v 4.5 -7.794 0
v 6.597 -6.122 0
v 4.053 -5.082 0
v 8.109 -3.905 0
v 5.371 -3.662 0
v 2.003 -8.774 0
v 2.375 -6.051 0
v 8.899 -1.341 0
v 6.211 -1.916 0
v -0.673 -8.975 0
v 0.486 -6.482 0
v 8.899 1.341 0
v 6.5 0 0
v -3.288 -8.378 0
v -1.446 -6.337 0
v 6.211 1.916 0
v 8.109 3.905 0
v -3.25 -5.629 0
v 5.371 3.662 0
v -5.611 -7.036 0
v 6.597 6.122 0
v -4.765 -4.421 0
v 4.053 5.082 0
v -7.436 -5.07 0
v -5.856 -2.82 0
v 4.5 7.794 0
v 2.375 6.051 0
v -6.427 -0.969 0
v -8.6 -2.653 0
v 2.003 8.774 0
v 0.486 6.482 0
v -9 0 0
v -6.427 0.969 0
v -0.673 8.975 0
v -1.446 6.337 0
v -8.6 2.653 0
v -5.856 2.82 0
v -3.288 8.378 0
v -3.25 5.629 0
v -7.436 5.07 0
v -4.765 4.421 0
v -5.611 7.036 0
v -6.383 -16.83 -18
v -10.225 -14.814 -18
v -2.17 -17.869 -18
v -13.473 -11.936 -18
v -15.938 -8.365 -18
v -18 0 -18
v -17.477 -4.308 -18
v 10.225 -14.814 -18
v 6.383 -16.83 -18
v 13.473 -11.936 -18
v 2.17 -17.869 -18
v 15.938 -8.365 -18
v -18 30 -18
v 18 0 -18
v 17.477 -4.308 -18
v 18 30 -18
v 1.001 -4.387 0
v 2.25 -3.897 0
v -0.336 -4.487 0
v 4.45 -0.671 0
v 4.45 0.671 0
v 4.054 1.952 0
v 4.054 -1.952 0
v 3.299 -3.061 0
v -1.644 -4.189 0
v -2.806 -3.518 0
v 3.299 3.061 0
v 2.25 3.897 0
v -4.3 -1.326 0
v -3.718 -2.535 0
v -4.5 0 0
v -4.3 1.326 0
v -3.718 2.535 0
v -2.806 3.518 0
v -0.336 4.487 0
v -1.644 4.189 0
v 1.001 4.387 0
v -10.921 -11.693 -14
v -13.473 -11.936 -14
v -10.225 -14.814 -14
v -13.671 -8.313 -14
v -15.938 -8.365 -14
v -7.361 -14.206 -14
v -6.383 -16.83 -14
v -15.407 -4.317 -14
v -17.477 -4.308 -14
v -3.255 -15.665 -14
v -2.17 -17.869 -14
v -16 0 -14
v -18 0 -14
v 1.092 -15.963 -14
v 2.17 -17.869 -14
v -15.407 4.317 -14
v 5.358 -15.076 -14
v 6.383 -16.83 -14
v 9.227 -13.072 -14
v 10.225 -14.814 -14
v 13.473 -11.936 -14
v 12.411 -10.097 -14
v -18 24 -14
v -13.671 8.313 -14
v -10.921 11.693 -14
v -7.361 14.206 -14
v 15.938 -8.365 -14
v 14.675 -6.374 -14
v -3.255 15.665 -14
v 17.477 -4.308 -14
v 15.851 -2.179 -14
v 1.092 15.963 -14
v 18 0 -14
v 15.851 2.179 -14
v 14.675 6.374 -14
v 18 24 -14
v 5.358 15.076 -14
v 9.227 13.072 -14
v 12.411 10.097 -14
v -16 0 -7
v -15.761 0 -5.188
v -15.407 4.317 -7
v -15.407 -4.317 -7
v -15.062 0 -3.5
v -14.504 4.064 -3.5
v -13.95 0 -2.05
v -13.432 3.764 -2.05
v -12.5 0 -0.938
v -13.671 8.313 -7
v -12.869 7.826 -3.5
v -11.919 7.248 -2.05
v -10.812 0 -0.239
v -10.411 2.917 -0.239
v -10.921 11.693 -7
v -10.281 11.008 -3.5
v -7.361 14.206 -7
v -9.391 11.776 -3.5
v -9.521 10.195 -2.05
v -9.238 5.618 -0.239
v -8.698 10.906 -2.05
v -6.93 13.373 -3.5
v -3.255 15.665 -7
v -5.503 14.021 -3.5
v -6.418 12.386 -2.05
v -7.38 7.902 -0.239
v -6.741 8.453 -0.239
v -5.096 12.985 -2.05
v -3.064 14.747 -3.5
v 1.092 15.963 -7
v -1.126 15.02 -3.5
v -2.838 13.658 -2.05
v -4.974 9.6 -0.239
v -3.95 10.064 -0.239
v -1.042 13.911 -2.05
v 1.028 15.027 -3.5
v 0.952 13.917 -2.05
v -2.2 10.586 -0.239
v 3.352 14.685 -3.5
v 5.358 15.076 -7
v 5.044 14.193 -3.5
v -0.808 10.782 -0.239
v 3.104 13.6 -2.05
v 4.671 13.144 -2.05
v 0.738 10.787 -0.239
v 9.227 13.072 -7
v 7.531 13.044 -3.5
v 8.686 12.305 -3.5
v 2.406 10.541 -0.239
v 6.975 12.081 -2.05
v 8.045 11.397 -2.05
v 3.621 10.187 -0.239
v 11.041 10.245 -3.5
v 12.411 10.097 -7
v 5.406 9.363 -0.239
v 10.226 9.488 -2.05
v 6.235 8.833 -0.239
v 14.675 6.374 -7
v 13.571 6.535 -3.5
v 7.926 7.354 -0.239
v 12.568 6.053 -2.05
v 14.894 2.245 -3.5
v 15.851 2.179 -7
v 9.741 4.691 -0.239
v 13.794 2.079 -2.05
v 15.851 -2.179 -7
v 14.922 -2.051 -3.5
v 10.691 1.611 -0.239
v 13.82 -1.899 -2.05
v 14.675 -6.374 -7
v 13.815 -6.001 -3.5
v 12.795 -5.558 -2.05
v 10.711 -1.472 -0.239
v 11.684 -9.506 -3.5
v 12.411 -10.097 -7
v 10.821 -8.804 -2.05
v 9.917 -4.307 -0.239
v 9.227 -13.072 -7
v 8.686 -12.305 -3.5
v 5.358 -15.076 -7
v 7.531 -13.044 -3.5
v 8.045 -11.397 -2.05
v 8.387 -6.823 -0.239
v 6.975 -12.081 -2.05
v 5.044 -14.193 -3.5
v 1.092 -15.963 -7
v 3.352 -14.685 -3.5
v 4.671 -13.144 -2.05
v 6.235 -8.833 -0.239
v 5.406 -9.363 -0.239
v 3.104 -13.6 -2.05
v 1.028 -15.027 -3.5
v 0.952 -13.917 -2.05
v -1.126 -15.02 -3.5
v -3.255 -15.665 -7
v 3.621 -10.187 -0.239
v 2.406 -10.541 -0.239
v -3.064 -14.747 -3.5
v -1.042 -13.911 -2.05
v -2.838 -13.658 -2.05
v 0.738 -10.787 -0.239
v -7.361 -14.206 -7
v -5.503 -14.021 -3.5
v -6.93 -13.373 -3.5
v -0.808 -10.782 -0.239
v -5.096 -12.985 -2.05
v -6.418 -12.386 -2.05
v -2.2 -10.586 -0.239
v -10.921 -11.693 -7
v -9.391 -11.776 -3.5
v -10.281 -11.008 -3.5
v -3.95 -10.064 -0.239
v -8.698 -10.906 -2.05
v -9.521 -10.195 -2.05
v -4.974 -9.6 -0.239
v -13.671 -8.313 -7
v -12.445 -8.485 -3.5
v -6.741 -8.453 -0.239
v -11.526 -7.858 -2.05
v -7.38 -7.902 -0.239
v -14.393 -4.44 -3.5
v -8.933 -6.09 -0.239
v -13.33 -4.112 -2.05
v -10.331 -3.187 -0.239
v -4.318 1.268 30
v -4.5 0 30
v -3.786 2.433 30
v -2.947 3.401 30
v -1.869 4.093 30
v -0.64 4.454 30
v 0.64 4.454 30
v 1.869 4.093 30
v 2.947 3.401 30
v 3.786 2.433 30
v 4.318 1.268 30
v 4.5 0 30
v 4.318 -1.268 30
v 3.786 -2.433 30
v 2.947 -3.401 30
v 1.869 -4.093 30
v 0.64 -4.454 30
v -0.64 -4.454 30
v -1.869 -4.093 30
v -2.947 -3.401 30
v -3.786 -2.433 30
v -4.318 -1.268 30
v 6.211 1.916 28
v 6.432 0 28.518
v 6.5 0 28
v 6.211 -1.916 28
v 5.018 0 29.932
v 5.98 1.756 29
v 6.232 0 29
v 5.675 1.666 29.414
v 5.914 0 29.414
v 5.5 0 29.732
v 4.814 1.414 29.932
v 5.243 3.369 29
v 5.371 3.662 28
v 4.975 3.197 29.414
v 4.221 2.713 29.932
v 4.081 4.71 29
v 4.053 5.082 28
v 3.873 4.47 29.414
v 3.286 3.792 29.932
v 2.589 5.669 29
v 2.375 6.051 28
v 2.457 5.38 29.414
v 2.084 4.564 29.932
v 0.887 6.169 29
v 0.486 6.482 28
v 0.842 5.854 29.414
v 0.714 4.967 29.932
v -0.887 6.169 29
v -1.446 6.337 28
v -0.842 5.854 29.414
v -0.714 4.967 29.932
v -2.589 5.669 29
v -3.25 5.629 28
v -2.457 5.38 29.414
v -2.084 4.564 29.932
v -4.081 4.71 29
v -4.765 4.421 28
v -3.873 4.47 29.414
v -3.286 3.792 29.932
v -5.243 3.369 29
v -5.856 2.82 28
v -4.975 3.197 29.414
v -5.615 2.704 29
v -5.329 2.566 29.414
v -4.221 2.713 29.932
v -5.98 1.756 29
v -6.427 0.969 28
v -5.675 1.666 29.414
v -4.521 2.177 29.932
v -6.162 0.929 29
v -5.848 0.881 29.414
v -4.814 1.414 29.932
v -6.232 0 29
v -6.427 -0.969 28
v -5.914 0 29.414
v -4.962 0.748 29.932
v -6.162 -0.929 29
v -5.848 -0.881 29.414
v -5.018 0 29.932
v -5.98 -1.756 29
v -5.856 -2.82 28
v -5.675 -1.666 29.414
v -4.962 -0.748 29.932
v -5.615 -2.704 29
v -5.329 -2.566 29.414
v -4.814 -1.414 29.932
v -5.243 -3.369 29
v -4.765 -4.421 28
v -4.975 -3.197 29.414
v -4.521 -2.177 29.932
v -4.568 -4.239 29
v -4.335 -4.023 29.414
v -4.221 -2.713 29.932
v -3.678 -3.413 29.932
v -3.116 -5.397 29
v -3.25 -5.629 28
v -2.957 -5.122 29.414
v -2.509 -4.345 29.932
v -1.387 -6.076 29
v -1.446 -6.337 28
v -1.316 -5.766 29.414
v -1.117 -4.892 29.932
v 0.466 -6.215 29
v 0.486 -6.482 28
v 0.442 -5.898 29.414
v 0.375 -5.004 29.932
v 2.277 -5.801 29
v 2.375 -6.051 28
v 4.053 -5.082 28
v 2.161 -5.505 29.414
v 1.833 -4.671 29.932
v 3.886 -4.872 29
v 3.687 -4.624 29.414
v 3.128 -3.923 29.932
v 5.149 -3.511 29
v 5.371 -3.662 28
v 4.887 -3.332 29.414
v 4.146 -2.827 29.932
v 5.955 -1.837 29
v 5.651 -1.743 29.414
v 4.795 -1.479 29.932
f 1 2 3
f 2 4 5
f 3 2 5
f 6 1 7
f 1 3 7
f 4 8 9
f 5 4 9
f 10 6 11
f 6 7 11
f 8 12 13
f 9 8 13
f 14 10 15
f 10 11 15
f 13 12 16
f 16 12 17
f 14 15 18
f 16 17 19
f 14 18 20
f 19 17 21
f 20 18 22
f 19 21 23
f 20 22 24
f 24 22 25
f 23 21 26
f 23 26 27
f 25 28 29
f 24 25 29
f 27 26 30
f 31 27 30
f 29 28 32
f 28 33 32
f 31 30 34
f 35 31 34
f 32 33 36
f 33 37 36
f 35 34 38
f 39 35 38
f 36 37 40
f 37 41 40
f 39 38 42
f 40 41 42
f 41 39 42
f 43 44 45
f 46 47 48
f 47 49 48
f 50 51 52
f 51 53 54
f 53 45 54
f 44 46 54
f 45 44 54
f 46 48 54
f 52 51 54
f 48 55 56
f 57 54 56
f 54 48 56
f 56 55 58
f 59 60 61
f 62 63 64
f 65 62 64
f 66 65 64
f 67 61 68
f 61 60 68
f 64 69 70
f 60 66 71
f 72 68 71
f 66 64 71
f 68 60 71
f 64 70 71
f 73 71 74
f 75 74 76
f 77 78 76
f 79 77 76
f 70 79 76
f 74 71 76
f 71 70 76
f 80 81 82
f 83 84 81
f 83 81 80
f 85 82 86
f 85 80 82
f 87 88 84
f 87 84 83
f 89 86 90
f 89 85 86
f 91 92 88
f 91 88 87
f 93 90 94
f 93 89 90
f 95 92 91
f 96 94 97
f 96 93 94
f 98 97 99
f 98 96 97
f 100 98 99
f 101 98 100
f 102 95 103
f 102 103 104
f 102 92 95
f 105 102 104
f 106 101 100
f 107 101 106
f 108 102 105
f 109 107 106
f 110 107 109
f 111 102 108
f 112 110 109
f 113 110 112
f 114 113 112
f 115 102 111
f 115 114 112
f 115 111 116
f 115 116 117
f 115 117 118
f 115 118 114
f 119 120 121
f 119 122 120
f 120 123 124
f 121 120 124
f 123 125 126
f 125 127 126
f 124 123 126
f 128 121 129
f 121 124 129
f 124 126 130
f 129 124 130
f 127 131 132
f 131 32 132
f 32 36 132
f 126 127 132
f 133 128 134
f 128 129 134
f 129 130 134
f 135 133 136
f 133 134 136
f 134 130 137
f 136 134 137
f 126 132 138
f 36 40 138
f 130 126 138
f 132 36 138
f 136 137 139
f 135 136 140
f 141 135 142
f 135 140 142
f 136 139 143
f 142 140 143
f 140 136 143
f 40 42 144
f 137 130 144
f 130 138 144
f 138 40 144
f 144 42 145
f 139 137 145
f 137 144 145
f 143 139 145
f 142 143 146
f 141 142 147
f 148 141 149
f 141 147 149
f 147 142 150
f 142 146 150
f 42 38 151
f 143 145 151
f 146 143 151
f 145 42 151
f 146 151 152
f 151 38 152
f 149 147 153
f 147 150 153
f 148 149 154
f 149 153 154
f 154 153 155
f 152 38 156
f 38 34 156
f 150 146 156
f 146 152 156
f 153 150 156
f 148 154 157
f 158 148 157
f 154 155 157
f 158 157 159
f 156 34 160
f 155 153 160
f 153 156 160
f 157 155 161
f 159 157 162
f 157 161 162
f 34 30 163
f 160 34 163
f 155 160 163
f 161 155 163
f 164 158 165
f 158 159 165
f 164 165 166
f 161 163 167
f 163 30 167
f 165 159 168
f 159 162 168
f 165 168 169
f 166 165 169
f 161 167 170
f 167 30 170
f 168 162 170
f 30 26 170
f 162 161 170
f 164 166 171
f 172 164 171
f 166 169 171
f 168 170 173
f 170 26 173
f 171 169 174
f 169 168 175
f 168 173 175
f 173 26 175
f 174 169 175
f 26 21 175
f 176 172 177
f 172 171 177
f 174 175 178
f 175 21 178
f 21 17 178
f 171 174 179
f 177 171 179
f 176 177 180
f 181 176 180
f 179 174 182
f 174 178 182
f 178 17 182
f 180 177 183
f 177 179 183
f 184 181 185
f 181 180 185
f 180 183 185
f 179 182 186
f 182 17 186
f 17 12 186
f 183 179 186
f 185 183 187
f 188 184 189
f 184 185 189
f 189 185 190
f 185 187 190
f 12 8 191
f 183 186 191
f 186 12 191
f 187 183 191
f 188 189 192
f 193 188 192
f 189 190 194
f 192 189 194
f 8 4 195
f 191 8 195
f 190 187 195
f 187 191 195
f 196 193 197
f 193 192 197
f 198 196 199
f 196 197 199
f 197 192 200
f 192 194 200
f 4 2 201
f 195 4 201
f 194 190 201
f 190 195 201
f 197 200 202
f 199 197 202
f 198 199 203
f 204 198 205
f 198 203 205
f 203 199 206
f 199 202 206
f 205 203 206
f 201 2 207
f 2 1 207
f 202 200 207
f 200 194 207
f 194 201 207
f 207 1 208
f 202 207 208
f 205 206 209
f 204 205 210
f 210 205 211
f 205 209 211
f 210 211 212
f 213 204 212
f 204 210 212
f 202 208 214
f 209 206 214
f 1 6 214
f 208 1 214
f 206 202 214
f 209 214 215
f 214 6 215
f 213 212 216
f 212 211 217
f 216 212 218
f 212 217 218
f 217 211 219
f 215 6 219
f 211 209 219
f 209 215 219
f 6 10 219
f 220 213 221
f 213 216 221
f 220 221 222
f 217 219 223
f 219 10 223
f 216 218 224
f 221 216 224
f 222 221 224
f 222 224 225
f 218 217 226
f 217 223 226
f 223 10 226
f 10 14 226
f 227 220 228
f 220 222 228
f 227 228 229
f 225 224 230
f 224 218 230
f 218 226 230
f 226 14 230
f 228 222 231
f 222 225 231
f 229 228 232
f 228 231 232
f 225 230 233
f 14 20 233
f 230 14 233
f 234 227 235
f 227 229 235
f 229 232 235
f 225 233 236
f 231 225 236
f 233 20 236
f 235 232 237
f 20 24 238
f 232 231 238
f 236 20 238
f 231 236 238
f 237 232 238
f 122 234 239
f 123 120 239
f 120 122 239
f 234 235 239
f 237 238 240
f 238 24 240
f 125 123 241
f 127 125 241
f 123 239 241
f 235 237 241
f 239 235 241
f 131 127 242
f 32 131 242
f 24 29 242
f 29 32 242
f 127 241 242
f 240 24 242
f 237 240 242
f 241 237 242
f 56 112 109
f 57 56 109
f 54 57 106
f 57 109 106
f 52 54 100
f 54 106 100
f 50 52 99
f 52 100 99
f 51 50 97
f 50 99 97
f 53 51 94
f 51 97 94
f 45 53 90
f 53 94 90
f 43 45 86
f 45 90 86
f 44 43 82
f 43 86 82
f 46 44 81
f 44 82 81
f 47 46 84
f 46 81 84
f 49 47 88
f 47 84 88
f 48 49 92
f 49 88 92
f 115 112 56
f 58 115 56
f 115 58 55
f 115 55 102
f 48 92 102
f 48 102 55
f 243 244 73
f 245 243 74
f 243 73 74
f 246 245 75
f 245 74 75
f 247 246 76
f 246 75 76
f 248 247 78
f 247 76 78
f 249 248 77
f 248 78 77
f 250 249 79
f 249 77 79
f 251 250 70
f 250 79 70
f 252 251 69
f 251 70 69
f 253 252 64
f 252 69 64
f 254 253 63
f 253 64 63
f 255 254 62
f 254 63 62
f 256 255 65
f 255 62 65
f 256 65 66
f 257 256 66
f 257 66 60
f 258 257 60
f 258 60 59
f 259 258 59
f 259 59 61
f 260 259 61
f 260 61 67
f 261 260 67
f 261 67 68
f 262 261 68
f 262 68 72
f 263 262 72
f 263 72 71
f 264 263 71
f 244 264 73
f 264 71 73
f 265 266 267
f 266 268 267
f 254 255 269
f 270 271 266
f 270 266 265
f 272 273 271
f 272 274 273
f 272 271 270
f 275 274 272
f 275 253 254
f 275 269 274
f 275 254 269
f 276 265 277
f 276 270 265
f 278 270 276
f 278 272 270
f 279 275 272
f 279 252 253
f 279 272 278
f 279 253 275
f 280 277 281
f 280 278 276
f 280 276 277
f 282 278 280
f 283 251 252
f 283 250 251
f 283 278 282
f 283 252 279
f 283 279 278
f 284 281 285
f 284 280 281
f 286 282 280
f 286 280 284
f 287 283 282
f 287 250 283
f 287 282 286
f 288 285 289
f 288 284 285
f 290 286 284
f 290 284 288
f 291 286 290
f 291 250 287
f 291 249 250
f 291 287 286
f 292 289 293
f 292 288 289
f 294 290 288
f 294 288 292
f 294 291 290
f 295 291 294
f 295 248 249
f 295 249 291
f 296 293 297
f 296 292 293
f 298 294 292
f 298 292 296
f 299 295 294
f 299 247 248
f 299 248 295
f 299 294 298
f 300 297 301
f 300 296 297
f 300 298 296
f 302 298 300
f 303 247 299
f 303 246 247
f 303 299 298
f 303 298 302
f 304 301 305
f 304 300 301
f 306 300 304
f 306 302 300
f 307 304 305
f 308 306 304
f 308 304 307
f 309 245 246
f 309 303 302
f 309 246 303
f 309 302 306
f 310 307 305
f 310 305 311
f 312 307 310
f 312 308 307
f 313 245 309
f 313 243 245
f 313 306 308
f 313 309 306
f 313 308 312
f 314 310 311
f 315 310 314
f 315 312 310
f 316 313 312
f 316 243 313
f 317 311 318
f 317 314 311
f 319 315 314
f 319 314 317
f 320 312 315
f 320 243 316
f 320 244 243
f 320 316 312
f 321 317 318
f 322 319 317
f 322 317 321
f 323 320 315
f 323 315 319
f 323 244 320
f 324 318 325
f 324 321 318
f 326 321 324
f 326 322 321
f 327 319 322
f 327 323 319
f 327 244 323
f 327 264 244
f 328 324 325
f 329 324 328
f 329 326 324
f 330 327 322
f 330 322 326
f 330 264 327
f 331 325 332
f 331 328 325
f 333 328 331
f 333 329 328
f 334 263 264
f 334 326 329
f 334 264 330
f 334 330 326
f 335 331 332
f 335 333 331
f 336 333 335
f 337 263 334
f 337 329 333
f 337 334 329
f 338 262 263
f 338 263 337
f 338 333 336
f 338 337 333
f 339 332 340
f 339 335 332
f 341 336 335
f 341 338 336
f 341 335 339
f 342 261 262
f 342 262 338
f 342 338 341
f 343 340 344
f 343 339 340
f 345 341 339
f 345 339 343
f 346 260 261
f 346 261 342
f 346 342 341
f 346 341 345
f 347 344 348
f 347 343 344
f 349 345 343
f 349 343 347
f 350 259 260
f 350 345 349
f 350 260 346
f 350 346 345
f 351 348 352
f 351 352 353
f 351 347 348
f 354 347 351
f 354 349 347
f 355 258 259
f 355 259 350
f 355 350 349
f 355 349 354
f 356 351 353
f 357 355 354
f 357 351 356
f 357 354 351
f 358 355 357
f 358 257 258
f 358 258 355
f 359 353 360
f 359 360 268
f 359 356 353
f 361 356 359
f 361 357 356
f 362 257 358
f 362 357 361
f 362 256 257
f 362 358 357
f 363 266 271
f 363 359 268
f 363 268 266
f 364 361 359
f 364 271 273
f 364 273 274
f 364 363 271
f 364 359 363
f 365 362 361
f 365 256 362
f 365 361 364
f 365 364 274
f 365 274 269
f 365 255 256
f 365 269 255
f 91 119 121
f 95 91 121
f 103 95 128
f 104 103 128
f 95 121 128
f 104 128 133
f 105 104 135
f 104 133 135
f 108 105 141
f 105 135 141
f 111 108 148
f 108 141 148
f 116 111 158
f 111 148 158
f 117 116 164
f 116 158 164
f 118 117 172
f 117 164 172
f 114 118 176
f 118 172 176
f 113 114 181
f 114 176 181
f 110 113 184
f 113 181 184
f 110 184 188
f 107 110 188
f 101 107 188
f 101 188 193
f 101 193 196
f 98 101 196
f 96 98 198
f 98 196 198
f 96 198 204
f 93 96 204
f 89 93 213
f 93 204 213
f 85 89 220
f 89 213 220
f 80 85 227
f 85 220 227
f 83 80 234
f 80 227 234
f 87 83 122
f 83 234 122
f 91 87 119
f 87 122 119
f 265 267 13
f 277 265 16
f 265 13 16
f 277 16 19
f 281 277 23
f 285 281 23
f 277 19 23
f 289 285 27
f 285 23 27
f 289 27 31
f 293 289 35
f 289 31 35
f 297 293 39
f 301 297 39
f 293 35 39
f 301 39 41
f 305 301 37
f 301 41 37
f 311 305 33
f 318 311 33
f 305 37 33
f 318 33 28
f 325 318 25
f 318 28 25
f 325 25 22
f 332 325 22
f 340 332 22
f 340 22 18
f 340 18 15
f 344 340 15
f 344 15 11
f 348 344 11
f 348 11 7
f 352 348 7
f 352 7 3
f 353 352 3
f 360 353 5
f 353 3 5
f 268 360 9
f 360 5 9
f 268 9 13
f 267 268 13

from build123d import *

# Parameters (mm, degrees)
SZKIC1_R                         = 6.5
DODANIE_WYCI_GNI_CIE1_DEPTH      = 30
ZAOKR_GLENIE1_R                  = 2
SZKIC2_R                         = 4.5
WYTNIJ_WYCI_GNI_CIE1_DEPTH       = 30
SZKIC3_R                         = 16
DODANIE_WYCI_GNI_CIE2_DEPTH      = 14
ZAOKR_GLENIE2_R                  = 7
SZKIC4_R                         = 18
DODANIE_WYCI_GNI_CIE3_DEPTH      = 4
DODANIE_WYCI_GNI_CIE4_REACH      = 61.397
DODANIE_WYCI_GNI_CIE4_END_RADIUS = 18
SZKIC5_W                         = 36
SZKIC5_H                         = 4
WYTNIJ_WYCI_GNI_CIE2_REACH       = 57.642


with BuildPart() as part:
    # Szkic1 → Dodanie-wyciągnięcie1 (new body)
    with BuildSketch(Plane.XY):
        Circle(SZKIC1_R)
    extrude(amount=DODANIE_WYCI_GNI_CIE1_DEPTH)

    # Zaokrąglenie1
    zaokr_glenie1_edges = [part.edges().sort_by_distance(p)[0] for p in [
        (-6.5, 0, 30),
    ]]
    fillet(zaokr_glenie1_edges, radius=ZAOKR_GLENIE1_R)

    # Szkic2 → Wytnij-wyciągnięcie1 (cut)
    with BuildSketch(Plane(origin=(0, 0, 0), x_dir=(-1, 0, 0), z_dir=(0, 0, -1))):
        Circle(SZKIC2_R)
    extrude(amount=-WYTNIJ_WYCI_GNI_CIE1_DEPTH, mode=Mode.SUBTRACT)

    # Szkic3 → Dodanie-wyciągnięcie2 (add)
    with BuildSketch(Plane(origin=(0, 0, 0), x_dir=(-1, 0, 0), z_dir=(0, 0, -1))):
        Circle(SZKIC3_R)
    extrude(amount=DODANIE_WYCI_GNI_CIE2_DEPTH)

    # Zaokrąglenie2
    zaokr_glenie2_edges = [part.edges().sort_by_distance(p)[0] for p in [
        (16, 0, 0),
    ]]
    fillet(zaokr_glenie2_edges, radius=ZAOKR_GLENIE2_R)

    # Szkic4 → Dodanie-wyciągnięcie3 (add)
    with BuildSketch(Plane(origin=(0, 0, -14), x_dir=(-1, 0, 0), z_dir=(0, 0, -1))):
        Circle(SZKIC4_R)
    extrude(amount=DODANIE_WYCI_GNI_CIE3_DEPTH)

    # Dodanie-wyciągnięcie4: up to this cylinder (the profile starts outside it)
    dodanie_wyci_gni_cie4_end = Plane(origin=(0, 0, -16), z_dir=(0, 0, 1)) * Cylinder(DODANIE_WYCI_GNI_CIE4_END_RADIUS, 159.794, mode=Mode.PRIVATE)
    # Szkic5 → Dodanie-wyciągnięcie4 (add, up to the surface)
    with BuildSketch(Plane(origin=(0, 30, 0), x_dir=(1, 0, 0), z_dir=(0, 1, 0)), mode=Mode.PRIVATE) as dodanie_wyci_gni_cie4_sk1:
        with Locations((0, 16)):
            Rectangle(SZKIC5_W, SZKIC5_H)
    dodanie_wyci_gni_cie4_tool1 = extrude(dodanie_wyci_gni_cie4_sk1.sketch, amount=-DODANIE_WYCI_GNI_CIE4_REACH, mode=Mode.PRIVATE) - dodanie_wyci_gni_cie4_end
    add(dodanie_wyci_gni_cie4_tool1.solids().sort_by_distance((0, 30, -16))[0])

    # Szkic6 → Wytnij-wyciągnięcie2 (cut, up to next)
    with BuildSketch(Plane(origin=(18, 0, 0), x_dir=(0, 0, -1), z_dir=(1, 0, 0)), mode=Mode.PRIVATE) as wytnij_wyci_gni_cie2_sk1:
        Polygon((18, 30), (14, 24), (14, 30), align=None)
    wytnij_wyci_gni_cie2_tool1 = extrude(wytnij_wyci_gni_cie2_sk1.sketch, amount=-WYTNIJ_WYCI_GNI_CIE2_REACH, mode=Mode.PRIVATE) & part.part
    add(wytnij_wyci_gni_cie2_tool1.solids().sort_by_distance((18, 28, -15.333333))[0], mode=Mode.SUBTRACT)


solid = part.part
